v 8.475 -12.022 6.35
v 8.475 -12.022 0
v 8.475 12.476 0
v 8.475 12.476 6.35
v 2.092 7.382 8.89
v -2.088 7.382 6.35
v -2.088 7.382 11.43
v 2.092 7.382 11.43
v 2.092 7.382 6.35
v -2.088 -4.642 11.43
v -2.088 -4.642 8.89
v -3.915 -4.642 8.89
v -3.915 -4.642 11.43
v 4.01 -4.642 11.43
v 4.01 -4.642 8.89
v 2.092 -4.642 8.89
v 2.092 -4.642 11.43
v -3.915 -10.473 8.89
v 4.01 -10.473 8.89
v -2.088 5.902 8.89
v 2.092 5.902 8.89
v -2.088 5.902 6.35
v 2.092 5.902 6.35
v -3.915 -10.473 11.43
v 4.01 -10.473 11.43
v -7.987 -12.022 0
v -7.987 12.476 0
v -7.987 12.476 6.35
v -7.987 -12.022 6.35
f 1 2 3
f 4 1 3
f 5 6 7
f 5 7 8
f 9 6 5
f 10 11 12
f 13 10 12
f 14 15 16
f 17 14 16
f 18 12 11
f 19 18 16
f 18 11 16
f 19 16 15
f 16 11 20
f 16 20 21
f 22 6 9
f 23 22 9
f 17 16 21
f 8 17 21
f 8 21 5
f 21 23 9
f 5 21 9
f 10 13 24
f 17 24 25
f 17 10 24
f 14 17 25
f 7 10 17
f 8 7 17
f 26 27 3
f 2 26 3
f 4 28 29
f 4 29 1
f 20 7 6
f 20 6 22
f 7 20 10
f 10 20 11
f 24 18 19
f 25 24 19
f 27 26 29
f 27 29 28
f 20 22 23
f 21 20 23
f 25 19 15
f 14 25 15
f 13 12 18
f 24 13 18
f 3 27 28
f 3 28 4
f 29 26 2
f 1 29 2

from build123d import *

# Parameters (mm, degrees)
F0_W     = 16.462284606
F0_H     = 24.4974466041
F1_DEPTH = 6.35
F3_W     = 4.1798030725
F3_H     = 1.4798403718
F4_DEPTH = 2.54
F5_W     = 4.1798030725
F5_H     = 12.0247541927
F5_H_2   = 5.8034774847
F6_DEPTH = 2.54


with BuildPart() as f1:
    # F0 (on Top) → F1 (new body)
    with BuildSketch(Plane.XY):
        with Locations((0.2442786936, 0.227171462)):
            Rectangle(F0_W, F0_H)
    extrude(amount=F1_DEPTH)


with BuildPart() as f4:
    # F3 (on face) → F4 (new body)
    with BuildSketch(Plane.XY.offset(6.35)):
        with Locations((0.0016469858, 6.6424182151)):
            Rectangle(F3_W, F3_H)
    extrude(amount=F4_DEPTH)

    # F5 (on face) → F6 (join)
    with BuildSketch(Plane.XY.offset(8.89)):
        with Locations((0.0016469858, 1.3699613046)):
            Rectangle(F5_W, F5_H)
        with Locations((0.0016469858, -7.5441545341)):
            Rectangle(F5_W, F5_H_2)
        Polygon((-2.0882545505, -10.4458932765), (-2.0882545505, -4.6424157917), (-3.9152200043, -4.6424157917), (-3.9152200043, -10.4728732258), (4.009673401, -10.4728732258), (4.009673401, -4.6424157917), (2.091548522, -4.6424157917), (2.091548522, -10.4458932765), align=None)
    extrude(amount=F6_DEPTH)


solid = Compound([f1.part, f4.part])
